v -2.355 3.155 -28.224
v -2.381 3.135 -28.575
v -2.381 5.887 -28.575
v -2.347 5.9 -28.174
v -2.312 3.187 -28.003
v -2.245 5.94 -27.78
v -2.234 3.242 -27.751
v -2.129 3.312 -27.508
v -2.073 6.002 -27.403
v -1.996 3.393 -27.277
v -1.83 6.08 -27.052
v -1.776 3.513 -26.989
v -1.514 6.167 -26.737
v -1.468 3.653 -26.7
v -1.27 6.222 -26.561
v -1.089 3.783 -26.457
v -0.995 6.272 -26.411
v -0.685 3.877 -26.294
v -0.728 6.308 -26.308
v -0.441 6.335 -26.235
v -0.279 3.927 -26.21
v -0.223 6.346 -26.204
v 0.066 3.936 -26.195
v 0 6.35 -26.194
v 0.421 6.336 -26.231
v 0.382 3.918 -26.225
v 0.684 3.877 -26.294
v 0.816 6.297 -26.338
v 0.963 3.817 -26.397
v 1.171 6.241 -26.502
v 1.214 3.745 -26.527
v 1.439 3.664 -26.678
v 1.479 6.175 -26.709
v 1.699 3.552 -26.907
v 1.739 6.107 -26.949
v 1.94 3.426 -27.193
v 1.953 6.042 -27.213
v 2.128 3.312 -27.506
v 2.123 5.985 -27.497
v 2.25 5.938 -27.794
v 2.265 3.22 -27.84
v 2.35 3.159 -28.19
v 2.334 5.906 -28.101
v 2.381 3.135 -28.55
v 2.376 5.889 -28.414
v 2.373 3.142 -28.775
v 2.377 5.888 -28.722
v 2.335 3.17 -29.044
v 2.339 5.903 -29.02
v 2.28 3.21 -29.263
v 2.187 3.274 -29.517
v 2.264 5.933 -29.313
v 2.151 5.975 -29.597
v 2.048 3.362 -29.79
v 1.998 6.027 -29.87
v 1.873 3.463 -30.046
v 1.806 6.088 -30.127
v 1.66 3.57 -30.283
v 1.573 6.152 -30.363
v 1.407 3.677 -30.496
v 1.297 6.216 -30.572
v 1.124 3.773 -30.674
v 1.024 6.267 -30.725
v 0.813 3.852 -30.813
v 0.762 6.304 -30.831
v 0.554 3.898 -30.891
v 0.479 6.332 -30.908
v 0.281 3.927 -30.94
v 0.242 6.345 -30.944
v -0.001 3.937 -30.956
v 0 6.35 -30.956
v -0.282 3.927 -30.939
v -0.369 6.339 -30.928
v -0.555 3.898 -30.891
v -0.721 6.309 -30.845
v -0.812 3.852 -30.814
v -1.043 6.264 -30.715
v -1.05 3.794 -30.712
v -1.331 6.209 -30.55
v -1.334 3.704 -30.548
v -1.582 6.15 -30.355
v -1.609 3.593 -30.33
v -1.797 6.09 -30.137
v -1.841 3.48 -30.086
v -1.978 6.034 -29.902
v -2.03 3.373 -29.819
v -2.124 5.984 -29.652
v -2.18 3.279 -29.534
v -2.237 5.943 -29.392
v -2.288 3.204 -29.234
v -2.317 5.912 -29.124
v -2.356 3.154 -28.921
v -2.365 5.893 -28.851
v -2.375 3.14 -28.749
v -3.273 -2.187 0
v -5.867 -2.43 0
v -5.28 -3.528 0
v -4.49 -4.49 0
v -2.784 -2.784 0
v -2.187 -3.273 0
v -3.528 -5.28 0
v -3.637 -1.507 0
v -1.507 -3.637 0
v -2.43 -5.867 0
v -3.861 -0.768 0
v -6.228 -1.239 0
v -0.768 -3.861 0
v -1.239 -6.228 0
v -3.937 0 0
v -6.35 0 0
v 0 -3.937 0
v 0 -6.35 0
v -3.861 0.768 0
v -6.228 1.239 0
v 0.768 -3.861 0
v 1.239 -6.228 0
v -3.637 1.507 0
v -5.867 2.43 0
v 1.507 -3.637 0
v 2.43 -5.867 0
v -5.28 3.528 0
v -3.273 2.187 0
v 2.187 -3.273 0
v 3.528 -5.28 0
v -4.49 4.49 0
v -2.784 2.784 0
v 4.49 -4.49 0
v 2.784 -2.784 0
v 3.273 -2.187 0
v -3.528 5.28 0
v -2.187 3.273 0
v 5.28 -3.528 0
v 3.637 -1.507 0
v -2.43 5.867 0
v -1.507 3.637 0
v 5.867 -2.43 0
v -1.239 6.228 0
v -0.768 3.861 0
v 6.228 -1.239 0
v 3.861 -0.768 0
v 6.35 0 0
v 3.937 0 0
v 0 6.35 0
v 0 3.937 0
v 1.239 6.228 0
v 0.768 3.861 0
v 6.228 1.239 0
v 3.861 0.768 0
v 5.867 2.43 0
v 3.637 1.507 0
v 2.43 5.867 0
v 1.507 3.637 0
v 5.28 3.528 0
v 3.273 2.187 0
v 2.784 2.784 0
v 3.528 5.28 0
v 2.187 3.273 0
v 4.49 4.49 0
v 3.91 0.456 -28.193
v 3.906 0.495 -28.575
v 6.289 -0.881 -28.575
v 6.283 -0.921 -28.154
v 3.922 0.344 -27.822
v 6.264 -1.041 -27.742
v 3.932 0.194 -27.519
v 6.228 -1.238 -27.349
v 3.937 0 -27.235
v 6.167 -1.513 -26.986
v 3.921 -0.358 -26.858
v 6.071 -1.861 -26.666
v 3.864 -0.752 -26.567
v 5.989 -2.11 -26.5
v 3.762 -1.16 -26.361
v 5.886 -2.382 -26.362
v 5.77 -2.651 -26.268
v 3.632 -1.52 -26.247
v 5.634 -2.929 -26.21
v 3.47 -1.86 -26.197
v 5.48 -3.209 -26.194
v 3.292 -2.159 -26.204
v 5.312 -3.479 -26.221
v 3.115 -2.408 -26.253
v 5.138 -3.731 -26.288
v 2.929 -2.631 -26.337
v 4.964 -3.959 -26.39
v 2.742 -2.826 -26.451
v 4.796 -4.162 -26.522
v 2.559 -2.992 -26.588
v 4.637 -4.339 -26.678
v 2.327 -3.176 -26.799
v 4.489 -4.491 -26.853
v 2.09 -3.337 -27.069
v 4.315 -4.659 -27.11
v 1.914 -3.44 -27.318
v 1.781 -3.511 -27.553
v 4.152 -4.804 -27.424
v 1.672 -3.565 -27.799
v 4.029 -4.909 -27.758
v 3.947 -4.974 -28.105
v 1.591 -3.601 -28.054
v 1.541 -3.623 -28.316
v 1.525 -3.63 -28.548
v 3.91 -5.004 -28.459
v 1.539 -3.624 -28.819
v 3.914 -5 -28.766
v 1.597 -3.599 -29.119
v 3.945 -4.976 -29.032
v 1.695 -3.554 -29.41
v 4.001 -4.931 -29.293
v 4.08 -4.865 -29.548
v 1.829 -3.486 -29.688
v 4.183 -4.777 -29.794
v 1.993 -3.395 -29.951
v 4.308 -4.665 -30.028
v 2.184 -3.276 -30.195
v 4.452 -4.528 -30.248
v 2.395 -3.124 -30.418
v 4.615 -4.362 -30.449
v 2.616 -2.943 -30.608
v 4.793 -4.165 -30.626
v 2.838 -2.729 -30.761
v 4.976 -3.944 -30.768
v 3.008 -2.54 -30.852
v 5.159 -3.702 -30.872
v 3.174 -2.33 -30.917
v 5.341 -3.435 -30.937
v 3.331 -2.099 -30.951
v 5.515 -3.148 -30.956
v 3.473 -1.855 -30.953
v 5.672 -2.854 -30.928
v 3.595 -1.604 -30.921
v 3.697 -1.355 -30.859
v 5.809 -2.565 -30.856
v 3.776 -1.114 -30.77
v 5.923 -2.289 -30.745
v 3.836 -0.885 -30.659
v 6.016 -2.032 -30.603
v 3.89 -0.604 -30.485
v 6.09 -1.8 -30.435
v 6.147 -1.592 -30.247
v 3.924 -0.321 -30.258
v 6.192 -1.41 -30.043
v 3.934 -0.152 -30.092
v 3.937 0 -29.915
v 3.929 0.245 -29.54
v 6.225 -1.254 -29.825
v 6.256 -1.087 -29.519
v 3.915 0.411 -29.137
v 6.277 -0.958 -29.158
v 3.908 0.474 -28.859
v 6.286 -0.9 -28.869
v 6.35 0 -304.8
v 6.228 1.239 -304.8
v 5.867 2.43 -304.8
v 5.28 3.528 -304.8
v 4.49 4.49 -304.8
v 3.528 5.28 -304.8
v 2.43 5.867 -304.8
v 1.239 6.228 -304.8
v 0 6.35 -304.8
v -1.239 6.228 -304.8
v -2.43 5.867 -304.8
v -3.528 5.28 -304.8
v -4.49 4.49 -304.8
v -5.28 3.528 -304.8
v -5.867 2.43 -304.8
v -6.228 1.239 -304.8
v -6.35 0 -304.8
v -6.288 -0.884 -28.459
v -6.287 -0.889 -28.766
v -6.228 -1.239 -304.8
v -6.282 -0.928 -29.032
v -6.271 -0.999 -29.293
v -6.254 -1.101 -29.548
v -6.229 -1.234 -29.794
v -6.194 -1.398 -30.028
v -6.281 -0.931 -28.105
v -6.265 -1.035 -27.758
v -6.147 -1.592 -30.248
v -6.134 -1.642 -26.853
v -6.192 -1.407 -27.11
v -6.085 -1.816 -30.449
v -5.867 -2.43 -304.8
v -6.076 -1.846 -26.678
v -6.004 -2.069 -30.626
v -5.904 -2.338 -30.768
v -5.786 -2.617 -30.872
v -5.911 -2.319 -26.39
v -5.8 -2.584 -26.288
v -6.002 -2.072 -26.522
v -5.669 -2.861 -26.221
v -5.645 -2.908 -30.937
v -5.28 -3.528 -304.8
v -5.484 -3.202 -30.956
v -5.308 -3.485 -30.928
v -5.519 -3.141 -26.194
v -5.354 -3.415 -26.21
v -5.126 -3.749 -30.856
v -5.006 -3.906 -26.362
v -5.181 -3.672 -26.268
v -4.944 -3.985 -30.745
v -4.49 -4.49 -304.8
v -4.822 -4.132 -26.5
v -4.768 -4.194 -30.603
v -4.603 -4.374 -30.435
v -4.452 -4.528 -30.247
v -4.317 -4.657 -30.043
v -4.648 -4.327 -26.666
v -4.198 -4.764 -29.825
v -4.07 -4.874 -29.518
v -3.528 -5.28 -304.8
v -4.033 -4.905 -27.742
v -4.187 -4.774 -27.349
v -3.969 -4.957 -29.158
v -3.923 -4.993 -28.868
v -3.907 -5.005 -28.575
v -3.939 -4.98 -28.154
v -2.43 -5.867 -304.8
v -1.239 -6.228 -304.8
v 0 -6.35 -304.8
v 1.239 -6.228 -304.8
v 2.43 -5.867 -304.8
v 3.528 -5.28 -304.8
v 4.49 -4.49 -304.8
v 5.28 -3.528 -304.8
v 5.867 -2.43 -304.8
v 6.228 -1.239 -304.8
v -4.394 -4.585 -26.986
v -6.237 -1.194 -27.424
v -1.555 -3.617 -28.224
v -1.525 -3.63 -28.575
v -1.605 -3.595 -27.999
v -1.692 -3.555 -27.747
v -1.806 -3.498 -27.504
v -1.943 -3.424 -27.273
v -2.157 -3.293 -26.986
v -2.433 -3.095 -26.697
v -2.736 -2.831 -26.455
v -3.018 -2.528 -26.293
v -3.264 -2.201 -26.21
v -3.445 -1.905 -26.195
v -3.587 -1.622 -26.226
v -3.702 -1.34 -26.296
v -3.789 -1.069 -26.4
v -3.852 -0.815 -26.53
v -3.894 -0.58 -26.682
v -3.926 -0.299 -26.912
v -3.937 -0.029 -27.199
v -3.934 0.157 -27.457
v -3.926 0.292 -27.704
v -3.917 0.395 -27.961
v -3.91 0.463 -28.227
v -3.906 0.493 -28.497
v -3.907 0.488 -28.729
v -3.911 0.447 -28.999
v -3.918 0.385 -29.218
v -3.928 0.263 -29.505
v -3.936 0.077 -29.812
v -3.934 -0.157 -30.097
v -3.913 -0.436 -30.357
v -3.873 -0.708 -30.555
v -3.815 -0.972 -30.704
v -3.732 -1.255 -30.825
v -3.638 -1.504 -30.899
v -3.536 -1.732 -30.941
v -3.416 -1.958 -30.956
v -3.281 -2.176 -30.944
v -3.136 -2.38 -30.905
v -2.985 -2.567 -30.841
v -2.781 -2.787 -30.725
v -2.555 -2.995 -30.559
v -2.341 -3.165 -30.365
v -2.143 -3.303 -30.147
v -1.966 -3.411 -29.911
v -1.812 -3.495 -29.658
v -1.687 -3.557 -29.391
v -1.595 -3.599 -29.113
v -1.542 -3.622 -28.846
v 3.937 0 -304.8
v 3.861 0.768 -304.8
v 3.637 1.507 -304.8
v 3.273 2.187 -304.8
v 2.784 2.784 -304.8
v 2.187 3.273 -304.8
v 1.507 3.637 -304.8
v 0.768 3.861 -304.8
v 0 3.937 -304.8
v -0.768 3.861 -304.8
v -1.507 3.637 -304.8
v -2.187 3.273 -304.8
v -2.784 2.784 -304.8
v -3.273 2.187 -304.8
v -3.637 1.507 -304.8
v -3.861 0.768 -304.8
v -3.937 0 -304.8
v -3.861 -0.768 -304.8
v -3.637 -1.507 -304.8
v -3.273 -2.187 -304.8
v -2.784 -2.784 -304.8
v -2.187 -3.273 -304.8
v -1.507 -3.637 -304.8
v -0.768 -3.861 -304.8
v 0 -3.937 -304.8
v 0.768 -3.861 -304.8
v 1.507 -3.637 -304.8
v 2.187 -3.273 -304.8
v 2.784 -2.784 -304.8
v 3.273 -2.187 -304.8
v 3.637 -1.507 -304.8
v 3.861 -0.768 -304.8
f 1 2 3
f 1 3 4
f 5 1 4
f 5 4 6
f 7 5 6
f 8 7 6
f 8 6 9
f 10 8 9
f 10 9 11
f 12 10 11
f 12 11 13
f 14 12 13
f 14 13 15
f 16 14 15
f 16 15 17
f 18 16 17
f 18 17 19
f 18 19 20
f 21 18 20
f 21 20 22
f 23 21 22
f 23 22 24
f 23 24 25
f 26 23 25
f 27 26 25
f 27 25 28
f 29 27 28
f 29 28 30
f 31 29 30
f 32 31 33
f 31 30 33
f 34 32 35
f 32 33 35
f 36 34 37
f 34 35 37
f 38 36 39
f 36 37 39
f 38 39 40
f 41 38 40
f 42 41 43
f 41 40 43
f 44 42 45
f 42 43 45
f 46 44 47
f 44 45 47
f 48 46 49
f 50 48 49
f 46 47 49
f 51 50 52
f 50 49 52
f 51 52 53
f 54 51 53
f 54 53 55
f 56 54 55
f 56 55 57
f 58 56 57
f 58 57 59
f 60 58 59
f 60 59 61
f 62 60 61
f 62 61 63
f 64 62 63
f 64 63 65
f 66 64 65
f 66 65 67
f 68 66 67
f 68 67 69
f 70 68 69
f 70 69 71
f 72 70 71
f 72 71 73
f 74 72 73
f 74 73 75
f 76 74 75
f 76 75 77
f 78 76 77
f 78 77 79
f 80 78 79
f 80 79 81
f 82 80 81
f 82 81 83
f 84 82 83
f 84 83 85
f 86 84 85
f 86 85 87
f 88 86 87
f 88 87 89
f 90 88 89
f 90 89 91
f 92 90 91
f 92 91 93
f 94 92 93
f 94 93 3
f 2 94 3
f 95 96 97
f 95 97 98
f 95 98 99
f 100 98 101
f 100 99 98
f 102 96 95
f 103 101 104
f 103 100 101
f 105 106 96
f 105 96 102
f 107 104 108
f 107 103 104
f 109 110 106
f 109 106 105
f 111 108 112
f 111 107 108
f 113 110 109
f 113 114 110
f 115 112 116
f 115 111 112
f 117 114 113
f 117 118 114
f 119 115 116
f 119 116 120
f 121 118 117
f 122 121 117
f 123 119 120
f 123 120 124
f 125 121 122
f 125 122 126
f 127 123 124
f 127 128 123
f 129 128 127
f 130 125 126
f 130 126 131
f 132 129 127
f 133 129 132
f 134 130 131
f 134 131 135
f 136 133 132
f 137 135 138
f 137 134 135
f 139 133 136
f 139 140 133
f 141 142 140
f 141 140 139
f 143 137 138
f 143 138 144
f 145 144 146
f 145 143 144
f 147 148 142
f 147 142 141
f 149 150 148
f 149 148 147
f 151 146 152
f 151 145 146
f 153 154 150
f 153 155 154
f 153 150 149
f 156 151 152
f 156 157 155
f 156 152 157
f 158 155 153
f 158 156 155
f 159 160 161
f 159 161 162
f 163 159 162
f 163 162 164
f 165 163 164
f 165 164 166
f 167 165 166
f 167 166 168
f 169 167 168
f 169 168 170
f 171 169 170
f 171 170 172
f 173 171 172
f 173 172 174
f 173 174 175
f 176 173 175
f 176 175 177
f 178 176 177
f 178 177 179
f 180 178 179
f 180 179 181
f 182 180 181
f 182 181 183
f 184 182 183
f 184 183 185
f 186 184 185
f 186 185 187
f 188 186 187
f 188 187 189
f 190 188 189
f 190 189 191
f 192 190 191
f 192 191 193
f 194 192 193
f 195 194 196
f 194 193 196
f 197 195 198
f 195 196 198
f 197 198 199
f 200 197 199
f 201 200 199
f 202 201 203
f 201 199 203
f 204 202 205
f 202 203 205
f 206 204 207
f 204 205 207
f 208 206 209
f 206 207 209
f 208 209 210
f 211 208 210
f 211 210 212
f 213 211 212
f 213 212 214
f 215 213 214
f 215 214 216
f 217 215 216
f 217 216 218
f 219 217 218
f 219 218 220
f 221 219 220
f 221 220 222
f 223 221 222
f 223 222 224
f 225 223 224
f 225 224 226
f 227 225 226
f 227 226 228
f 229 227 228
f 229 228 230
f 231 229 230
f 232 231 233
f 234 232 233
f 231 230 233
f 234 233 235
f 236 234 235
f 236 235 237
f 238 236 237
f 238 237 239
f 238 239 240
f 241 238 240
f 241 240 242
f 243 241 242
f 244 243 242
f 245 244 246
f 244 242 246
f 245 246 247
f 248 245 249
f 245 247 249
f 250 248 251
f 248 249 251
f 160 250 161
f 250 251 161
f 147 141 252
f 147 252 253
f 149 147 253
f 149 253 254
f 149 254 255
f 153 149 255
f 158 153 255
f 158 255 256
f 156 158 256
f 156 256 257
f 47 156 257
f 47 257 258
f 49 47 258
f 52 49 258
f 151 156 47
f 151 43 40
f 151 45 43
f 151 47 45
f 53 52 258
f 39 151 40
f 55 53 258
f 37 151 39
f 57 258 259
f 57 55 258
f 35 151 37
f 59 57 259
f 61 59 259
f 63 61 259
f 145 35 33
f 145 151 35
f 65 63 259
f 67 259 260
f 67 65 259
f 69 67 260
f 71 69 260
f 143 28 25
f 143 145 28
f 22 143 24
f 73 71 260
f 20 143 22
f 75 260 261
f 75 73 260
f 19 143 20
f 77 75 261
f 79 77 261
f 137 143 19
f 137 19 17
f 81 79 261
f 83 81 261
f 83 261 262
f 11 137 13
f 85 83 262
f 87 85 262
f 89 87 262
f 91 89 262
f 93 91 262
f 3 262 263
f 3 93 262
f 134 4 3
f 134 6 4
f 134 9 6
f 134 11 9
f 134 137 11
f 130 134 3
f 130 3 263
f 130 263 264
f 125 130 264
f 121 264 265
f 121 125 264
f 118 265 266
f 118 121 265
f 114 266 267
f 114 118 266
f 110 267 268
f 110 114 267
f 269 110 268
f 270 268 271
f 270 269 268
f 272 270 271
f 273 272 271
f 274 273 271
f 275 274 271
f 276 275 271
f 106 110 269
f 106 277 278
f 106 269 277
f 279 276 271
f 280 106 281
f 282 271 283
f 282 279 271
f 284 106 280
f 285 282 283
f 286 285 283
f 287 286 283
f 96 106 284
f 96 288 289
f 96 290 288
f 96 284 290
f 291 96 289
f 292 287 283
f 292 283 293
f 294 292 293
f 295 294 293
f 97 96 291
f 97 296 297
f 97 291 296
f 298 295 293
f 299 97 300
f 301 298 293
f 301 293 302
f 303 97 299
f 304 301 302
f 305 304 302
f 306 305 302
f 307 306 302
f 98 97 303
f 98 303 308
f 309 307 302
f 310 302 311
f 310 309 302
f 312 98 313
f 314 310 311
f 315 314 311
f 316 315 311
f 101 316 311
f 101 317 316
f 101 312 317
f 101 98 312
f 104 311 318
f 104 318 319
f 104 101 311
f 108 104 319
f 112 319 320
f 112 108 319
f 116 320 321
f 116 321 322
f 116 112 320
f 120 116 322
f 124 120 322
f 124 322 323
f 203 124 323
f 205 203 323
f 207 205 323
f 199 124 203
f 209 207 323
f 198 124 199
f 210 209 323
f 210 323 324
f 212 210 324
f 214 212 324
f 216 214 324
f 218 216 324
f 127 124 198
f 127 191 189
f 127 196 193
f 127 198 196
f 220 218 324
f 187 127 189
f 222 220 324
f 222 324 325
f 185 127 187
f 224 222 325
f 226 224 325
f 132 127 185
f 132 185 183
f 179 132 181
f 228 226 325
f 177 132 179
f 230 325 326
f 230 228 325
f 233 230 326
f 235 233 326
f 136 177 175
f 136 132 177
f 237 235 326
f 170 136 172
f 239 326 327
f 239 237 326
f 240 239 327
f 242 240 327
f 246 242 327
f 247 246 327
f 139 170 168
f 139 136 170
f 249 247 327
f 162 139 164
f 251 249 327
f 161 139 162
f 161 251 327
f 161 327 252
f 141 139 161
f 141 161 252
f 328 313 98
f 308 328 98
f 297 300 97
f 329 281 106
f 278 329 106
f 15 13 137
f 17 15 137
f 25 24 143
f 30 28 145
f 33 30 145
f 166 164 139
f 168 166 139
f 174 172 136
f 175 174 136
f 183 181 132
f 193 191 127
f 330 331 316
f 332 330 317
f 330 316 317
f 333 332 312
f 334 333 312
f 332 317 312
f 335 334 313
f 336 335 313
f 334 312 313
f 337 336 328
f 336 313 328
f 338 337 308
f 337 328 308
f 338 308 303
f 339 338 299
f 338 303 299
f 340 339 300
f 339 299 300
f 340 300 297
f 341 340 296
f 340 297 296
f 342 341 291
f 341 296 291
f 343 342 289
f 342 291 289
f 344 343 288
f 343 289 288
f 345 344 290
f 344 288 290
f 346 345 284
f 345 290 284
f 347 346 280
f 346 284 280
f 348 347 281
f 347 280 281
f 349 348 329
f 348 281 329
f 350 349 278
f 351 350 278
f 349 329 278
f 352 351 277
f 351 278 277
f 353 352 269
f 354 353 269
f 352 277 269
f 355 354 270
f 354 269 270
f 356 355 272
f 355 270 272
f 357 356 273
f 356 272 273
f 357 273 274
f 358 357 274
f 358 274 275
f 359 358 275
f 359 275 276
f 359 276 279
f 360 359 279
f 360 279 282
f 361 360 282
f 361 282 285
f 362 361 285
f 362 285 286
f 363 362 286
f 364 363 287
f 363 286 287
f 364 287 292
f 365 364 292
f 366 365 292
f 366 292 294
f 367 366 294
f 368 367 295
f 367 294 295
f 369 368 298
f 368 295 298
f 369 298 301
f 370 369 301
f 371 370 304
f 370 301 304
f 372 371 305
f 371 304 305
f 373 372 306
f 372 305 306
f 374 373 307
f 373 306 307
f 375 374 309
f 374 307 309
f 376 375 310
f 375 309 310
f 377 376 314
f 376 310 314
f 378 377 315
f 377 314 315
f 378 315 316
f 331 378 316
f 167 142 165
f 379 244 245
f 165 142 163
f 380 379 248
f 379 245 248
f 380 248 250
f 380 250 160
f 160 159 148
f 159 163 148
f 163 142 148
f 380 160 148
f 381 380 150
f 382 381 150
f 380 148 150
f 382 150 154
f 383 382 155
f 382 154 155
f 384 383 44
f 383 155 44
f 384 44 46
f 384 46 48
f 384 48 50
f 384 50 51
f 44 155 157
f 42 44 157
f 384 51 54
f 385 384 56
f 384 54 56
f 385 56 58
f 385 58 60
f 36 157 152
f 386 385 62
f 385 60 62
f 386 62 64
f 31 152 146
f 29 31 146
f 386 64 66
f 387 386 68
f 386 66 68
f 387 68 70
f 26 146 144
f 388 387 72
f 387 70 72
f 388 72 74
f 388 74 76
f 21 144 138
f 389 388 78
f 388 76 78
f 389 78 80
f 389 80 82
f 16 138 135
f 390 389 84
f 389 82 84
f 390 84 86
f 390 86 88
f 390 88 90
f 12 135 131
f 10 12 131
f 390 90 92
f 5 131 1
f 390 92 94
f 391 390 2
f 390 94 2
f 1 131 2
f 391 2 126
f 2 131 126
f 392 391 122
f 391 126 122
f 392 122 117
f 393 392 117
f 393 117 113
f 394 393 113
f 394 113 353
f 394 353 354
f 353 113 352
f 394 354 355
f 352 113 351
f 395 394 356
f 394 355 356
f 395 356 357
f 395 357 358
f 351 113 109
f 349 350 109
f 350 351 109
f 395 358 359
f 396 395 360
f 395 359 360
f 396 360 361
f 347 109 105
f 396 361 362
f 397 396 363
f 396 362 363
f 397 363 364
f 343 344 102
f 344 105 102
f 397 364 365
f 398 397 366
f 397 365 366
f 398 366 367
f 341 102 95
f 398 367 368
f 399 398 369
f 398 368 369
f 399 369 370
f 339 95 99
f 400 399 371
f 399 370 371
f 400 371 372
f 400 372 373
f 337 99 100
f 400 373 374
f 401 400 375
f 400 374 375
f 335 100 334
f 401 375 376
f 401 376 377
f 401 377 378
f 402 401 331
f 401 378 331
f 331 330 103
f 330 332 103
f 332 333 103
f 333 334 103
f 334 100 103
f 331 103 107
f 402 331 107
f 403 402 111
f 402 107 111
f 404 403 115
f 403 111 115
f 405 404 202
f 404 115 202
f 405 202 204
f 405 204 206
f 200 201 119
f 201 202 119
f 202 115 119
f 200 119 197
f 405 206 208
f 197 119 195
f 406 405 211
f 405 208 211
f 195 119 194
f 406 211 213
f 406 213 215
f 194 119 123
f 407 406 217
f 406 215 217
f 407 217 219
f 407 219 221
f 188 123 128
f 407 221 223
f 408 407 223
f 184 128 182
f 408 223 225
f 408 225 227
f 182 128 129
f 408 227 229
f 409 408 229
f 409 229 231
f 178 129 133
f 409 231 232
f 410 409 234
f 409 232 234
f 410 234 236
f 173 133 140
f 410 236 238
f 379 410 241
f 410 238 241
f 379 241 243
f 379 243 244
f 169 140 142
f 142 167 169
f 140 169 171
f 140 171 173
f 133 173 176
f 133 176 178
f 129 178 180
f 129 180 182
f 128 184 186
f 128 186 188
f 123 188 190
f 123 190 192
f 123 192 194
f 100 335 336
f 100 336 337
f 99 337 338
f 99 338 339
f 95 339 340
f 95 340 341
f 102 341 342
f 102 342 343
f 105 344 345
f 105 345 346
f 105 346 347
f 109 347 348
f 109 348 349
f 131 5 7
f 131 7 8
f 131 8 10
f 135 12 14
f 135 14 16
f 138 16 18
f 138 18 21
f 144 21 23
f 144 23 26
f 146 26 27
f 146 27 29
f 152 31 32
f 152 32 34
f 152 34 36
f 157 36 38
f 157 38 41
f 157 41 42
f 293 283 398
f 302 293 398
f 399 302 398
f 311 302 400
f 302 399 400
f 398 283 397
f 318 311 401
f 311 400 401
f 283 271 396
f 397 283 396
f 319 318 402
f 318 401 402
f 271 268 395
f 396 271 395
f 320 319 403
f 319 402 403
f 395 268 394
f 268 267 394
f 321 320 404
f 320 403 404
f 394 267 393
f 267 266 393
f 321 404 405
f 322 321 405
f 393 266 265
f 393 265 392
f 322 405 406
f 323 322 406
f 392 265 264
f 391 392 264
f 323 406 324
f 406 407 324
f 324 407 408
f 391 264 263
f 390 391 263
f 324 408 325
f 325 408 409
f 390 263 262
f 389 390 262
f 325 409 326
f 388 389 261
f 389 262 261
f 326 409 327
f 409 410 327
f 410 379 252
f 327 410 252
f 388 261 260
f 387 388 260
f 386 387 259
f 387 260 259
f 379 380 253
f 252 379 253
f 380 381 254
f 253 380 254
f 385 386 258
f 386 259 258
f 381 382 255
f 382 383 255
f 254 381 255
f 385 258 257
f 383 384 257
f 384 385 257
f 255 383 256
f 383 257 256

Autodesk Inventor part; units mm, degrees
sketch "Sketch1" plane through (0, 0, 0) normal (0, 0, 1) x (1, 0, 0)
  circle A0 centre (0, 0) radius 6.35
  circle A1 centre (0, 0) radius 3.937
  dimension "d0" = 12.7
  dimension "d1" = 2.413
extrude "Extrusion1" add sketch "Sketch1" against normal blind 304.8
ref_plane "Work Plane1" through (0, 0, -28.575) normal (0, 0, 1) x (1, 0, 0)
sketch "Sketch2" plane through (0, 0, -28.575) normal (0, 0, 1) x (1, 0, 0)
  circle A0 centre (0, 0) radius 6.35 projected
  line L0 (0, 0) -> (5.4993, -3.175) construction
  line L1 (0, 0) -> (0, 6.35) construction
  line L2 (0, 0) -> (-5.4993, -3.175) construction
  dimension "d6" = 120
  dimension "d7" = 120
ref_plane "Work Plane2" through (0, 6.35, -28.575) normal (0, 1, 0) x (-1, 0, 0)
sketch "Sketch3" plane through (0, 6.35, -28.575) normal (0, 1, 0) x (-1, 0, 0)
  circle A0 centre (0, 0) radius 2.3813
  dimension "d8" = 4.7625
extrude "Extrusion2" cut sketch "Sketch3" against normal up to next
ref_plane "Work Plane3" through (5.4993, -3.175, -28.575) normal (0.866, -0.5, 0) x (0.5, 0.866, 0)
sketch "Sketch4" plane through (5.4993, -3.175, -28.575) normal (0.866, -0.5, 0) x (0.5, 0.866, 0)
  circle A0 centre (0, 0) radius 2.3813
  dimension "d11" = 4.7625
extrude "Extrusion3" cut sketch "Sketch4" against normal up to next
ref_plane "Work Plane4" through (-5.4993, -3.175, -28.575) normal (-0.866, -0.5, 0) x (0.5, -0.866, 0)
sketch "Sketch5" plane through (-5.4993, -3.175, -28.575) normal (-0.866, -0.5, 0) x (0.5, -0.866, 0)
  circle A0 centre (0, 0) radius 2.3812
  dimension "d14" = 4.7625
extrude "Extrusion4" cut sketch "Sketch5" against normal up to next
properties part number "transmission tube v1"
